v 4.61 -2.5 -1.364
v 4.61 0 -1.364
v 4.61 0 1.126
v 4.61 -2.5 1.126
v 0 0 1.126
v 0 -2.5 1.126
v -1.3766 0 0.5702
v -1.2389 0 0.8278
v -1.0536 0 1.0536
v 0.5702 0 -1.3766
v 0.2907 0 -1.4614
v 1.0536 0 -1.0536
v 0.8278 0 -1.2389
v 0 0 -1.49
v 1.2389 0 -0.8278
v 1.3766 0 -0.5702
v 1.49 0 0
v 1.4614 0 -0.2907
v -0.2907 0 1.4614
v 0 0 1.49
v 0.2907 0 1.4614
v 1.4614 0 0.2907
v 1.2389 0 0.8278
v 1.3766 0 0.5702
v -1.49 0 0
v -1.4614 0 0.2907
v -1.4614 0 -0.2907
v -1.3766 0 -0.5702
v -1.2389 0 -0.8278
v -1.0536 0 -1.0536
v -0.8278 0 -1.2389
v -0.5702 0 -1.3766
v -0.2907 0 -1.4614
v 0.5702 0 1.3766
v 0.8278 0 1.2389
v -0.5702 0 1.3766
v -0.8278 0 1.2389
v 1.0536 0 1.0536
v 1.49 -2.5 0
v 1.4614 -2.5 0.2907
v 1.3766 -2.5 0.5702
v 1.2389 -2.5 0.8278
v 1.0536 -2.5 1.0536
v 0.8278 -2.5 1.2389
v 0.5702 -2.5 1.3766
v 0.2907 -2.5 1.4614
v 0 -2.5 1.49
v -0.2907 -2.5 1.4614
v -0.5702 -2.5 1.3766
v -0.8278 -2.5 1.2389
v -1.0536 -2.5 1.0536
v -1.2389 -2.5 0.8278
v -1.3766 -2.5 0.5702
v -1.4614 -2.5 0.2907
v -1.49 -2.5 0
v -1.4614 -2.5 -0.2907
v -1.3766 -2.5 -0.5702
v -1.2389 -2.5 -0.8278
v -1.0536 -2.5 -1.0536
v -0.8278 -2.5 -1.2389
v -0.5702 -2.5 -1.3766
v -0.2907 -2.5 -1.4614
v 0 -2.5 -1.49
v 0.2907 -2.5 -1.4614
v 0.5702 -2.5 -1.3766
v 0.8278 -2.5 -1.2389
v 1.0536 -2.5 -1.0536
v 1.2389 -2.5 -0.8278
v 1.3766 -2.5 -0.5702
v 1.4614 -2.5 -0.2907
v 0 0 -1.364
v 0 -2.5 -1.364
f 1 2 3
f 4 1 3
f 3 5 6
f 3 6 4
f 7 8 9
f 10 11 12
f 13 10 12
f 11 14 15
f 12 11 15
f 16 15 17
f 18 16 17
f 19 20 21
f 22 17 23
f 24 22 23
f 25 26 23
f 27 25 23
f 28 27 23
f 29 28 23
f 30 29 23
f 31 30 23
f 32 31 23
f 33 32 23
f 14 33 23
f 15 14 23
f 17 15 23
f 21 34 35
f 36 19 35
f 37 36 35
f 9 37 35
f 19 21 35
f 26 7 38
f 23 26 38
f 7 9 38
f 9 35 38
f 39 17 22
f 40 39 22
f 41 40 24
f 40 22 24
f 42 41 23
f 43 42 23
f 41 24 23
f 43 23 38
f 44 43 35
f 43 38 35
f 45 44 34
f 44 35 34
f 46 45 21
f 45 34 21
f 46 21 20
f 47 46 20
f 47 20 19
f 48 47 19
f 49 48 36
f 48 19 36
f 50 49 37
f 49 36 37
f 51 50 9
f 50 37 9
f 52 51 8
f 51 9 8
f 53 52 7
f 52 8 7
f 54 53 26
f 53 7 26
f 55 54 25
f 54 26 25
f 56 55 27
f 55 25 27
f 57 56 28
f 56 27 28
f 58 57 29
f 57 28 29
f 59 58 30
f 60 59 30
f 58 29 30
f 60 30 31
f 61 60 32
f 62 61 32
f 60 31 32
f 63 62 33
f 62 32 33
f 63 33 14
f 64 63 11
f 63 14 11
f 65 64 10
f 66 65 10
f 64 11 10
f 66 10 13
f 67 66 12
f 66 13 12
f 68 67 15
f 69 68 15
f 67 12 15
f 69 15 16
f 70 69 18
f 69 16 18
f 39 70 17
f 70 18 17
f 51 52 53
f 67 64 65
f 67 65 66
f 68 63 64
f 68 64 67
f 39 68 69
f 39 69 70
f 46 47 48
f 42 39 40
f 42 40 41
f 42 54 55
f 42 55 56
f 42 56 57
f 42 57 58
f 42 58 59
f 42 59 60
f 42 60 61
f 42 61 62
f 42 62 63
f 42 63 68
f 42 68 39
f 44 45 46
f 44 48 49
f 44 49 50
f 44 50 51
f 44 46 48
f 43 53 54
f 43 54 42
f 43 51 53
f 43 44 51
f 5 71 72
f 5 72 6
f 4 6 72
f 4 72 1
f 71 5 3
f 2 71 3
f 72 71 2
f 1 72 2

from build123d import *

# Parameters (mm, degrees)
F0_R     = 5.455
F0_R_2   = 4.045
F1_DEPTH = 1.8
F0_R_3   = 2.625
F0_R_4   = 1.685
F3_R     = 1.49
F4_DEPTH = 2.5
F5_W     = 4.61
F5_H     = 2.49
F6_DEPTH = 2.5


with BuildPart() as f1:
    # F0 (on Front) → F1 (new body)
    with BuildSketch(Plane.XZ):
        Circle(F0_R)
        Circle(F0_R_2, mode=Mode.SUBTRACT)
    extrude(amount=F1_DEPTH)


with BuildPart() as f1b:
    # F0 (on Front) → F1, piece 2 (new body)
    with BuildSketch(Plane.XZ):
        Circle(F0_R_3)
        Circle(F0_R_4, mode=Mode.SUBTRACT)
    extrude(amount=F1_DEPTH)


with BuildPart() as f4:
    # F3 (on Front) → F4 (new body)
    with BuildSketch(Plane.XZ):
        Circle(F3_R)
    extrude(amount=F4_DEPTH)


with BuildPart() as f6:
    # F5 (on Front) → F6 (new body, through all)
    with BuildSketch(Plane.XZ):
        with Locations((2.305, -0.1189748681)):
            Rectangle(F5_W, F5_H)
    extrude(amount=F6_DEPTH)


solid = Compound([f4.part, f6.part])
